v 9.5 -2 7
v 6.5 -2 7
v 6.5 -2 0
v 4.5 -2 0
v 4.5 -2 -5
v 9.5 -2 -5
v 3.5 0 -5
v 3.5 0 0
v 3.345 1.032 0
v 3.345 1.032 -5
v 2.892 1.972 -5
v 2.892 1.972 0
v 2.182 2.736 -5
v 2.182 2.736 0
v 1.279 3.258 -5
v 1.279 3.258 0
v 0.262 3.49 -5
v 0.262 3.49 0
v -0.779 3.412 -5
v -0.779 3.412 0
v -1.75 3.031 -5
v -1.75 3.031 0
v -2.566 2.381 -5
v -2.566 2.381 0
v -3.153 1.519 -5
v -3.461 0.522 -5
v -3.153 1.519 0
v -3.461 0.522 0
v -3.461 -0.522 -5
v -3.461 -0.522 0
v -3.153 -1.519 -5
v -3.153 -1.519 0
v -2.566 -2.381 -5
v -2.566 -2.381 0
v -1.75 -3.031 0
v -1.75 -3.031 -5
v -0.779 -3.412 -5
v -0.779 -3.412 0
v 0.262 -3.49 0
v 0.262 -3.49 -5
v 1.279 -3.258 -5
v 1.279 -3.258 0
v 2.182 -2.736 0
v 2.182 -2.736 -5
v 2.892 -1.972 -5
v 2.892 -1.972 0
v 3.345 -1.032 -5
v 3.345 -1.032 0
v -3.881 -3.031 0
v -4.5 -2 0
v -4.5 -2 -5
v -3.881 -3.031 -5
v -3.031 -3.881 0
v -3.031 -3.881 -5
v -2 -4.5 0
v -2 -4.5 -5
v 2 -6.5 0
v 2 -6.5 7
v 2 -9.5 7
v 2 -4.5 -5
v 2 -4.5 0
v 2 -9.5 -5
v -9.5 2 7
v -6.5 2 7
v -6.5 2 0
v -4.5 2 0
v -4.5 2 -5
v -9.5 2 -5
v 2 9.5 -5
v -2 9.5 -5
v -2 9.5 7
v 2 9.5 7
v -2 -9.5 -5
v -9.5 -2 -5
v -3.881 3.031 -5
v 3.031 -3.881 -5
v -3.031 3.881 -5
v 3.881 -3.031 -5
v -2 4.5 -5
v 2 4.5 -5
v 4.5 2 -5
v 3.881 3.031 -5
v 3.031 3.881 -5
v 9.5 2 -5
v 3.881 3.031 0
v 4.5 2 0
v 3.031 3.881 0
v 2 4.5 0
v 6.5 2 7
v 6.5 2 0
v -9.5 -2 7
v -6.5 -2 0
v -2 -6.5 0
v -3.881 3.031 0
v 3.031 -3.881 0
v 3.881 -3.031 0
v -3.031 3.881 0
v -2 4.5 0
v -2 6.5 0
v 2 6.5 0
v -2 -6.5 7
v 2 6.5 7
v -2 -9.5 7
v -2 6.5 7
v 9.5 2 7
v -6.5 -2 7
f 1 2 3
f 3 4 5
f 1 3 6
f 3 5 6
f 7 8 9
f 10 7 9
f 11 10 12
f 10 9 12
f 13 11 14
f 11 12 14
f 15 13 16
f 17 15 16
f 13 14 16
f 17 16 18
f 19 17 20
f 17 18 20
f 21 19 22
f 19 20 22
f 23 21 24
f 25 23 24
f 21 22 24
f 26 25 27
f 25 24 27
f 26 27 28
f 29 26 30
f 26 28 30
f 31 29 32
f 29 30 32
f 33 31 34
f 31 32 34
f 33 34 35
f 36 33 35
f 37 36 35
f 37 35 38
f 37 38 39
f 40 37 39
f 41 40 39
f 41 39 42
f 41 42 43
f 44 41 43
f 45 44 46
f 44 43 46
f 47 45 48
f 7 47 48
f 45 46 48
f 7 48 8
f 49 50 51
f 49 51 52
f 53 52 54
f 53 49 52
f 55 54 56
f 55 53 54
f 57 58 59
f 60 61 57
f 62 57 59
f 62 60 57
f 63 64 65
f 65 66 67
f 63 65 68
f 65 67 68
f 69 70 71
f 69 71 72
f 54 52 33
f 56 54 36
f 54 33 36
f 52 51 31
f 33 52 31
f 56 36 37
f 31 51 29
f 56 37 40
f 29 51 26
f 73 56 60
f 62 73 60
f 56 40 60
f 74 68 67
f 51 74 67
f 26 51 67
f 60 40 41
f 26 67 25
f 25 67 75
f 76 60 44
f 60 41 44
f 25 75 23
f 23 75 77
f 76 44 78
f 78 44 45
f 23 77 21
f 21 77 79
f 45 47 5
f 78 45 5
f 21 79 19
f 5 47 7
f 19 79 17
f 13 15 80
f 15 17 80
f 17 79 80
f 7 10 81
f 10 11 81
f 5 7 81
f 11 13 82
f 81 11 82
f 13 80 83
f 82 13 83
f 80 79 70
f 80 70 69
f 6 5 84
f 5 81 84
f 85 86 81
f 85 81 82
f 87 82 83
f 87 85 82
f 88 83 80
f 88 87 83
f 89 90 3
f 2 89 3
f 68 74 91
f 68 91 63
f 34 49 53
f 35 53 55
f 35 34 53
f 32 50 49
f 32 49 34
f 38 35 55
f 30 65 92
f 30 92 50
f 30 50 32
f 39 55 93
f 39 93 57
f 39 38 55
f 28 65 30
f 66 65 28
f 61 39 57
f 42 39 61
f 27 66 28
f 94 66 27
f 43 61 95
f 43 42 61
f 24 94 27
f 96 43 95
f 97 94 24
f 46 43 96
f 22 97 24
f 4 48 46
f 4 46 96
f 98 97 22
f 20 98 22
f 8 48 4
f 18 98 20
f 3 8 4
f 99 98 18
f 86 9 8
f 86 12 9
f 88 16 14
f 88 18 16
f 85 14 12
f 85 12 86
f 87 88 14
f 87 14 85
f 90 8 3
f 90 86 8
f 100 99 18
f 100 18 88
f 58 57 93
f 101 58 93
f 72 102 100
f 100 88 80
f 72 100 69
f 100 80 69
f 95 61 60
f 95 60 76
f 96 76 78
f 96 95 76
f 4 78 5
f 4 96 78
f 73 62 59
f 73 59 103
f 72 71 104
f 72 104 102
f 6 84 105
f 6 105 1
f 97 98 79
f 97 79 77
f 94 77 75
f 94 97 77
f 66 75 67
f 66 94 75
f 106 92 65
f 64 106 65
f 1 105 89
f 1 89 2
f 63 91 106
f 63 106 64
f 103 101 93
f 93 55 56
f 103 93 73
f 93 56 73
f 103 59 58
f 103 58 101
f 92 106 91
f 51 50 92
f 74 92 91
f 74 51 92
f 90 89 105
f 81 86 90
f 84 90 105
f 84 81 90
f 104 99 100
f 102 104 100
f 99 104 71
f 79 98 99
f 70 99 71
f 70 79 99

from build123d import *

# Parameters (mm, degrees)
SKETCH_R           = 3.5
PAD_DEPTH          = 5
SKETCH001_W        = 4
SKETCH001_H        = 3
PAD001_DEPTH       = 7
POLARPATTERN_COUNT = 4


with BuildPart() as part:
    # Sketch → Pad (new body)
    with BuildSketch(Plane.XY):
        with BuildLine():
            Line((-9.5, 2), (-9.5, -2))
            Line((-9.5, -2), (-4.5, -2))
            ThreePointArc((-4.5, -2), (-3.482097, -3.482097), (-2, -4.5))
            Line((-2, -9.5), (-2, -4.5))
            Line((-2, -9.5), (2, -9.5))
            Line((2, -9.5), (2, -4.5))
            ThreePointArc((2, -4.5), (3.482097, -3.482097), (4.5, -2))
            Line((9.5, -2), (4.5, -2))
            Line((9.5, -2), (9.5, 2))
            Line((9.5, 2), (4.5, 2))
            ThreePointArc((4.5, 2), (3.482097, 3.482097), (2, 4.5))
            Line((2, 9.5), (2, 4.5))
            Line((2, 9.5), (-2, 9.5))
            Line((-2, 9.5), (-2, 4.5))
            ThreePointArc((-2, 4.5), (-3.482097, 3.482097), (-4.5, 2))
            Line((-9.5, 2), (-4.5, 2))
        make_face()
        Circle(SKETCH_R, mode=Mode.SUBTRACT)
    extrude(amount=-PAD_DEPTH)

    # Sketch001 → Pad001 (join)
    with BuildSketch(Plane.XY):
        with Locations((0, 8)):
            Rectangle(SKETCH001_W, SKETCH001_H)
    pad001 = extrude(amount=PAD001_DEPTH)

    # PolarPattern: Pad001 ×4 about axis
    polarpattern_axis = Axis((0, 0, 0), (0, 0, 1))
    for i in range(1, POLARPATTERN_COUNT):
        add(pad001.rotate(polarpattern_axis, i * 360 / POLARPATTERN_COUNT))


solid = part.part
